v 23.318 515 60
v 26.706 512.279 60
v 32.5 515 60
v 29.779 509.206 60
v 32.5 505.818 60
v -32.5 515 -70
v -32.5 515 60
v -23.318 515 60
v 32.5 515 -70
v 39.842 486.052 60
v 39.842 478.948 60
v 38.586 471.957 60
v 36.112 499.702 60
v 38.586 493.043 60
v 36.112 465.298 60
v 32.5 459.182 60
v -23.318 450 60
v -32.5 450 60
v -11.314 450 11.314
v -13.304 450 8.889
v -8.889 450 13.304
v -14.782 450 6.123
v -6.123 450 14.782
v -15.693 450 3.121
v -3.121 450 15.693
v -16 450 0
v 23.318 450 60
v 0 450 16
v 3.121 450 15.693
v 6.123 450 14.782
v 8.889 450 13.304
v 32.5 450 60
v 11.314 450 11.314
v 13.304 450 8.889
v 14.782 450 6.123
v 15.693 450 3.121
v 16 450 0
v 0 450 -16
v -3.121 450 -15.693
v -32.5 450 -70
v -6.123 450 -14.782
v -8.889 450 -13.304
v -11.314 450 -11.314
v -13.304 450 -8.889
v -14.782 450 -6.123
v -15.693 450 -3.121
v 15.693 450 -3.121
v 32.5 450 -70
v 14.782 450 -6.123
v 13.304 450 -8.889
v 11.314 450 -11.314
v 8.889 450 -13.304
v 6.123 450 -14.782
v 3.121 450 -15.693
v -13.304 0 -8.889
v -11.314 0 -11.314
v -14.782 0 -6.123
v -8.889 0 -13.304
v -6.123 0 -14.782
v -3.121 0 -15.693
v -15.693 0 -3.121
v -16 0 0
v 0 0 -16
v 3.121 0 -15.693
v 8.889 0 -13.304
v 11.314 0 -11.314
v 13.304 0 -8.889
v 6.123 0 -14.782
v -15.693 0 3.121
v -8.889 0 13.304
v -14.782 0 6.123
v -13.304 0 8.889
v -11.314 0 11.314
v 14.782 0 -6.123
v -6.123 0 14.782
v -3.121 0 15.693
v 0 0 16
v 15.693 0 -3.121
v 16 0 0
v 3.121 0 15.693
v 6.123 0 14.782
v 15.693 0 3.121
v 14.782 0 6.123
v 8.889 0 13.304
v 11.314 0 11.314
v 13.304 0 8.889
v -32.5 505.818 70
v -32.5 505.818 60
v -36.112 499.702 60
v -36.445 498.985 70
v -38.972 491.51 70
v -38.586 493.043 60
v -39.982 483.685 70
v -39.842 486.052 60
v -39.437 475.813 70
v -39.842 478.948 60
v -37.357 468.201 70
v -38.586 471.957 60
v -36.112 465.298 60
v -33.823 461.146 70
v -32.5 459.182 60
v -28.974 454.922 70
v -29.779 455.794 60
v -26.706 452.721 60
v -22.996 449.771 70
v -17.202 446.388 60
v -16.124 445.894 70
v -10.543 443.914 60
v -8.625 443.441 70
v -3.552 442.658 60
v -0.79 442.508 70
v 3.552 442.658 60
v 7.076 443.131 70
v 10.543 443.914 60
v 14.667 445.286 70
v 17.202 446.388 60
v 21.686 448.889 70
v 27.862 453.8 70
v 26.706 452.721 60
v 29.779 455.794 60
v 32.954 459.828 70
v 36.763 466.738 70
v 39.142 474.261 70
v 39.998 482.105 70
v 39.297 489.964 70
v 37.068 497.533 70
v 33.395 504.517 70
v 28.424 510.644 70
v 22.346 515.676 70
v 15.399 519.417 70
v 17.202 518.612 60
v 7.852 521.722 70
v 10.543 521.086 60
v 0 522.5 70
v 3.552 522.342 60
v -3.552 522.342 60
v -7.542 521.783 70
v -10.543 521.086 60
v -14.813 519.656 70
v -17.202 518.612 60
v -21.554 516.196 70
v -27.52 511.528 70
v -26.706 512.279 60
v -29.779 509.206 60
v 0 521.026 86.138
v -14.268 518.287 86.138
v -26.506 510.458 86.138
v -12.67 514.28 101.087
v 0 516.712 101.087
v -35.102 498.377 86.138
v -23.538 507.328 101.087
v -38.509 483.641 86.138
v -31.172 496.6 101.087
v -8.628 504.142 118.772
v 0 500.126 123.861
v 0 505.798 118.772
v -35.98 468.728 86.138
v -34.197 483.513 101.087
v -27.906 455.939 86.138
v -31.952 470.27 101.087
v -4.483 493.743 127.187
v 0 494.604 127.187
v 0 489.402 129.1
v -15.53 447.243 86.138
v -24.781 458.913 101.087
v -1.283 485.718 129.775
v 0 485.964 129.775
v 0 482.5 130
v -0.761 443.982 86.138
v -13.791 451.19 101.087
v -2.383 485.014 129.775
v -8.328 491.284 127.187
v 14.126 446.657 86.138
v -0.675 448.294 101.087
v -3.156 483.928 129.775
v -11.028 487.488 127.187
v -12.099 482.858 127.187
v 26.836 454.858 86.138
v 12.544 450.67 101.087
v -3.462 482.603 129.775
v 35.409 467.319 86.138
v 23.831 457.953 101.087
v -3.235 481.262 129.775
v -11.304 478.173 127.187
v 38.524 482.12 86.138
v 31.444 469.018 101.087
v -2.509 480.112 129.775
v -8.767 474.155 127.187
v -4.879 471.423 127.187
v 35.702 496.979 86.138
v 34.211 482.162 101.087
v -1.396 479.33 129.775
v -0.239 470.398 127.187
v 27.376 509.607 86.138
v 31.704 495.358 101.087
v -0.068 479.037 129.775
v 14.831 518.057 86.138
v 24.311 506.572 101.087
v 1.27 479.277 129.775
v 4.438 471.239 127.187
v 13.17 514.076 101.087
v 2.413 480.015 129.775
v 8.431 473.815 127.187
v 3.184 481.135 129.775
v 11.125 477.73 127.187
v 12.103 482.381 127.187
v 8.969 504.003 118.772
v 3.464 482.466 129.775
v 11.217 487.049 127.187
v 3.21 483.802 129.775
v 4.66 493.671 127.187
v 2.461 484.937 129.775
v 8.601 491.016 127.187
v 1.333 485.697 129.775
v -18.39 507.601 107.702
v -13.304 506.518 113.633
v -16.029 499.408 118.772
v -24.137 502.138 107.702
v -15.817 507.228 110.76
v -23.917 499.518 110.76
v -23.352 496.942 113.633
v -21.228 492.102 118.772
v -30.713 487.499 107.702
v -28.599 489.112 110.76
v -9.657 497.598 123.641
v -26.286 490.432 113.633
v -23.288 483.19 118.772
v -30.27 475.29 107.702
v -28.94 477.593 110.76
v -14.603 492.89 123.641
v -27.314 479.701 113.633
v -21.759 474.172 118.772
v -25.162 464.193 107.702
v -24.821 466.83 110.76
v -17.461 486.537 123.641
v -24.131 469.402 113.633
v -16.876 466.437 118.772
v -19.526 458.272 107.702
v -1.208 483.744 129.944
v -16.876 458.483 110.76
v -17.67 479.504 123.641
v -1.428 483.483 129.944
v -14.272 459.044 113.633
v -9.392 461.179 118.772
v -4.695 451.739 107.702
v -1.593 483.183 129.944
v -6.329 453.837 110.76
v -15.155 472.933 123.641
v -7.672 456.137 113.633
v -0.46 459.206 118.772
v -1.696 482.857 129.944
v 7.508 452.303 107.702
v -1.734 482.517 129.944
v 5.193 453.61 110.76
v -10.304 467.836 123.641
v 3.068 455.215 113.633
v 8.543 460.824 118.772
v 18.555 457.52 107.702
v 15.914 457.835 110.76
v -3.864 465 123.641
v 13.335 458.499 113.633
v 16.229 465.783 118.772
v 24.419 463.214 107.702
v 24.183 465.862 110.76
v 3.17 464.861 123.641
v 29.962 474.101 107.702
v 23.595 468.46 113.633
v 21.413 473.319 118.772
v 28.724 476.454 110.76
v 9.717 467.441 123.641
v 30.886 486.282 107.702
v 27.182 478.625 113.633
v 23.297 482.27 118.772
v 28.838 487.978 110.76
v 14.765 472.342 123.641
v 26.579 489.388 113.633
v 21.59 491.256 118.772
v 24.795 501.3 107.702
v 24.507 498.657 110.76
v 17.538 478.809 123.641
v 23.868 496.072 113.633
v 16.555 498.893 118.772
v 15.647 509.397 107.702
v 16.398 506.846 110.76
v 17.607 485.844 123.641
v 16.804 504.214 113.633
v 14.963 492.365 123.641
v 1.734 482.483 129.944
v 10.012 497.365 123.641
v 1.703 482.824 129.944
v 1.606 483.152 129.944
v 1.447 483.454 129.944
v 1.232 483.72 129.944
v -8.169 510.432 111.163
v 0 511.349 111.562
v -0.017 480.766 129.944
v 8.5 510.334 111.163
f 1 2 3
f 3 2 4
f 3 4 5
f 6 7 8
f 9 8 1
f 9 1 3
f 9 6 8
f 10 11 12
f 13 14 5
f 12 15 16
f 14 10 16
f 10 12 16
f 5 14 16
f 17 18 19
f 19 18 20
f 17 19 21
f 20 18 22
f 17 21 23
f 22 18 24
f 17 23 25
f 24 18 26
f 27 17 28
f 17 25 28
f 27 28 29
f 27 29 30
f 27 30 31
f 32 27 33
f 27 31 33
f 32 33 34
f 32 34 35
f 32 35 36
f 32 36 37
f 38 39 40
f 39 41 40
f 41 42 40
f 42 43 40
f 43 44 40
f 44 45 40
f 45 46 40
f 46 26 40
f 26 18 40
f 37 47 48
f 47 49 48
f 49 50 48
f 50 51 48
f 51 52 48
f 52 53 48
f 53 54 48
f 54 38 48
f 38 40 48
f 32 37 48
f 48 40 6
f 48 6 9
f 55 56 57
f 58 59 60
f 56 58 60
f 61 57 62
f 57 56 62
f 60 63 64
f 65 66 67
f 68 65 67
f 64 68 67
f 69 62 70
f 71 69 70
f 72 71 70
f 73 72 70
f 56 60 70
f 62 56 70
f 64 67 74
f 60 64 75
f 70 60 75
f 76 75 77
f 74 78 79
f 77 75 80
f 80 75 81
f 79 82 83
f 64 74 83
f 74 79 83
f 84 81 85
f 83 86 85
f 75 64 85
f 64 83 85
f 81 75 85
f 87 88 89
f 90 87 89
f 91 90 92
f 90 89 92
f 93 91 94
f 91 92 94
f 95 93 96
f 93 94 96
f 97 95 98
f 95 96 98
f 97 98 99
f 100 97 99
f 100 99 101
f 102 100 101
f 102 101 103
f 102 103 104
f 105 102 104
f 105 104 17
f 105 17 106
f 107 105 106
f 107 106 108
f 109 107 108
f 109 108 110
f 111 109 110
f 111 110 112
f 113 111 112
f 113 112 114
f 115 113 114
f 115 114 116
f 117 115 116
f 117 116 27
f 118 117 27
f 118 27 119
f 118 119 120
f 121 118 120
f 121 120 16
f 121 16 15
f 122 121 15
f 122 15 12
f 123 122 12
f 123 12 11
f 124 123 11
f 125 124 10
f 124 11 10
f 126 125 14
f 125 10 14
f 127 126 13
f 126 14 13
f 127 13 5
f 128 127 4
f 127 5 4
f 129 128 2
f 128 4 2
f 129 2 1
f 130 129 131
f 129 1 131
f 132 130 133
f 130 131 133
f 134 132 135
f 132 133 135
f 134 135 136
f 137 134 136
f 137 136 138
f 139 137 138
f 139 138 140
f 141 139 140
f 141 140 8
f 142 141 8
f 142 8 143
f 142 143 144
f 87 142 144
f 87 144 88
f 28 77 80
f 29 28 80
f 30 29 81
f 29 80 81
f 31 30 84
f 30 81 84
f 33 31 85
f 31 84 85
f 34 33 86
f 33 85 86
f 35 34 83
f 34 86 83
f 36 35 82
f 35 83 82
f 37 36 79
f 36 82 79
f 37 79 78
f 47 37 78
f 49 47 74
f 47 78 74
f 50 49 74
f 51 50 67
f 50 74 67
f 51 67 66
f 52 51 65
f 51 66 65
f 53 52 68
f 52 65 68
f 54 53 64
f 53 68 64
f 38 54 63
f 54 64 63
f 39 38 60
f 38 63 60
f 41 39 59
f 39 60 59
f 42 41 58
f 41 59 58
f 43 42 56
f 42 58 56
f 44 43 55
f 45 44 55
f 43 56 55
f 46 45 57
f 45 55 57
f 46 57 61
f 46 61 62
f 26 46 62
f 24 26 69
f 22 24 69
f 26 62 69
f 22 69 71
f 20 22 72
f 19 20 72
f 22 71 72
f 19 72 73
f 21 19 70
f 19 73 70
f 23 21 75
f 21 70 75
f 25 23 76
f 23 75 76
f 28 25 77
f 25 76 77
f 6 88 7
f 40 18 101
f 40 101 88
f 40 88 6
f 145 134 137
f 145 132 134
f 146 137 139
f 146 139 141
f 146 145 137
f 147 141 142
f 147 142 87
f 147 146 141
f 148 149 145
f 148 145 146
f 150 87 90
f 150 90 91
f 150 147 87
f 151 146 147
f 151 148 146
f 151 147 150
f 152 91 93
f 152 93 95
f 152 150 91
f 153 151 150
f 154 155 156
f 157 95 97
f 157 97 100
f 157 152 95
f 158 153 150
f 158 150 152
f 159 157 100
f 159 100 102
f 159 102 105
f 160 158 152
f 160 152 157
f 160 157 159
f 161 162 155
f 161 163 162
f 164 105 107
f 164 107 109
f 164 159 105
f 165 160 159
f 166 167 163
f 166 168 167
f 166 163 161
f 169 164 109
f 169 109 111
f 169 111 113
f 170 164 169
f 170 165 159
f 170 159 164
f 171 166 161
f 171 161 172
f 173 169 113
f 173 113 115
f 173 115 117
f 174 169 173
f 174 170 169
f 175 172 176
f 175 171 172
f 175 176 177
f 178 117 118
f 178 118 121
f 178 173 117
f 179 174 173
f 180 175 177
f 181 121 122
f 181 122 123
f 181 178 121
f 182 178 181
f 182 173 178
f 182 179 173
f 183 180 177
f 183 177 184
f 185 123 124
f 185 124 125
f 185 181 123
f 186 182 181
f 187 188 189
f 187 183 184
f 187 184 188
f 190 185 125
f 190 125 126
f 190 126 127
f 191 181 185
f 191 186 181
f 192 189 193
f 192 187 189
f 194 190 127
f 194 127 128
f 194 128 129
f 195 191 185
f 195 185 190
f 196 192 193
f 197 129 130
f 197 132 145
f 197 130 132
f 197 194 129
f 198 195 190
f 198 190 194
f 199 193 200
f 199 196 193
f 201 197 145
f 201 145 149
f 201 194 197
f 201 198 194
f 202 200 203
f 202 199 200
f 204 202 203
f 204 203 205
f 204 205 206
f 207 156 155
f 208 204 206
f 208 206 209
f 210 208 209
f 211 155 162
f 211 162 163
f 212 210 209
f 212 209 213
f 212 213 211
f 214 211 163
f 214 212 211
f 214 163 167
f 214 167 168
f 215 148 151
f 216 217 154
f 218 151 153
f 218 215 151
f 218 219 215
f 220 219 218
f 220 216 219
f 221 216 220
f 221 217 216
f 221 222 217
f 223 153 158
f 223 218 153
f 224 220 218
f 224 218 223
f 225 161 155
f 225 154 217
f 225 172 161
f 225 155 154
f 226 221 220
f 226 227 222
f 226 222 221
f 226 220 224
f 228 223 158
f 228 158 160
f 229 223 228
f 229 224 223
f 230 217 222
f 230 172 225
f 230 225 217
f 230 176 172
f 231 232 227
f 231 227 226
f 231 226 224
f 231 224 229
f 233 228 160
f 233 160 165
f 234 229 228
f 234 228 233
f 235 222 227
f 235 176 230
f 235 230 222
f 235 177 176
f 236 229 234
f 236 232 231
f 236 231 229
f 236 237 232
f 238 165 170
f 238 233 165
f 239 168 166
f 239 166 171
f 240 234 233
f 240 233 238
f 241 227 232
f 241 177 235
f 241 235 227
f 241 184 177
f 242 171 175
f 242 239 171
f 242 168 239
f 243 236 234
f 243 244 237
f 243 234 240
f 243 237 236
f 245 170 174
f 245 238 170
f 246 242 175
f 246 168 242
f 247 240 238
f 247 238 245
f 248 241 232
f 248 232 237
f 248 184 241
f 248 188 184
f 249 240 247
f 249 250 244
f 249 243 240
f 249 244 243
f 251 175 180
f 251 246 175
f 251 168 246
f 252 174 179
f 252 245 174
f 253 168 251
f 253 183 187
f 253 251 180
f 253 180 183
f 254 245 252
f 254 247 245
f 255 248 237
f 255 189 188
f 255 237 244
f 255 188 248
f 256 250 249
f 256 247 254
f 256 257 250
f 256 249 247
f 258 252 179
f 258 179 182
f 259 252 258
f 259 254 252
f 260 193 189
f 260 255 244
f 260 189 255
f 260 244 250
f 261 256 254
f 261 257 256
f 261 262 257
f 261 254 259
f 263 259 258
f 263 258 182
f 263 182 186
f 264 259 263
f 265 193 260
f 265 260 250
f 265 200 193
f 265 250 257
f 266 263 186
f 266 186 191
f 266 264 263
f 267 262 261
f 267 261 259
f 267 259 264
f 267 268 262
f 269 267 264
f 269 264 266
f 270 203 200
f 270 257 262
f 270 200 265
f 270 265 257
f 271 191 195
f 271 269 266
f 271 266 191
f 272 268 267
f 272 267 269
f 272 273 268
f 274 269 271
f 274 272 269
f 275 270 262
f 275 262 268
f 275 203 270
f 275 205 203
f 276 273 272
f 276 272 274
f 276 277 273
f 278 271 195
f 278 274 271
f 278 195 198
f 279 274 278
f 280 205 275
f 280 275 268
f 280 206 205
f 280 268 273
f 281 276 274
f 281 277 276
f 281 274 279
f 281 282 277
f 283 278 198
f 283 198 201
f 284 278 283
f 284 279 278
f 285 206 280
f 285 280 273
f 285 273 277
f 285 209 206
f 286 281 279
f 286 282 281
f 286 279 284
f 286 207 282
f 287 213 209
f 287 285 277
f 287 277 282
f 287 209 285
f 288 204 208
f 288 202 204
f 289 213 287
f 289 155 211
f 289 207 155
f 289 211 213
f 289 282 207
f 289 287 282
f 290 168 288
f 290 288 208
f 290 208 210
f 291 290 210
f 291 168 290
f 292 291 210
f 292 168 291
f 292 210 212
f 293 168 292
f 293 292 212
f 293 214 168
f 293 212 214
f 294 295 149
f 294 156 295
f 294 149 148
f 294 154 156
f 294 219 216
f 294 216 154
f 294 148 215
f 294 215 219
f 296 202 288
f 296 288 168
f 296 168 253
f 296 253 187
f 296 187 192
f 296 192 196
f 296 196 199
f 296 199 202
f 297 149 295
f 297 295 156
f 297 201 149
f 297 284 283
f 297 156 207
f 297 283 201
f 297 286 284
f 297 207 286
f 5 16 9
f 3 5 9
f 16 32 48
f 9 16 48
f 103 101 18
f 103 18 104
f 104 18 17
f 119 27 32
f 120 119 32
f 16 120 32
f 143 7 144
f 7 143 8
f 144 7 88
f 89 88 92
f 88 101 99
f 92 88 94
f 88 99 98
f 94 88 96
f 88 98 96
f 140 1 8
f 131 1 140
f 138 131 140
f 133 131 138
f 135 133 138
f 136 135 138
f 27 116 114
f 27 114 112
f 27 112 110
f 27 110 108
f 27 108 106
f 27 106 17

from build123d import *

# Parameters (mm, degrees)
SKETCH1_R           = 16
BOSS_EXTRUDE1_DEPTH = 450
SKETCH2_W           = 65
SKETCH2_H           = 130
BOSS_EXTRUDE2_DEPTH = 65
SKETCH3_R           = 40
BOSS_EXTRUDE3_DEPTH = 10
DOME1_FACE_RADIUS   = 40
DOME1_HEIGHT        = 60


with BuildPart() as part:
    # Sketch1 → Boss-Extrude1 (new body)
    with BuildSketch(Plane(origin=(0, 0, 0), x_dir=(1, 0, 0), z_dir=(0, 1, 0))):
        Circle(SKETCH1_R)
    extrude(amount=BOSS_EXTRUDE1_DEPTH)

    # Sketch2 → Boss-Extrude2 (add)
    with BuildSketch(Plane(origin=(0, 450, 0), x_dir=(1, 0, 0), z_dir=(0, 1, 0))):
        with Locations((0, 5)):
            Rectangle(SKETCH2_W, SKETCH2_H)
    extrude(amount=BOSS_EXTRUDE2_DEPTH)

    # Sketch3 → Boss-Extrude3 (add)
    with BuildSketch(Plane.XY.offset(60)):
        with Locations((0, 482.5)):
            Circle(SKETCH3_R)
    extrude(amount=BOSS_EXTRUDE3_DEPTH)

    # Dome1: an elliptical dome of height H over a round flat face of radius A is half a spheroid: the quarter ellipse of half axes A and H revolved about the face's axis
    with BuildSketch(Plane((0, 482.5, 70), x_dir=(0, 1, 0), z_dir=(1, 0, 0)), mode=Mode.PRIVATE) as dome1_quarter:
        Ellipse(DOME1_FACE_RADIUS, DOME1_HEIGHT)
        Rectangle(DOME1_FACE_RADIUS, DOME1_HEIGHT, align=(Align.MIN, Align.MIN), mode=Mode.INTERSECT)
    revolve(dome1_quarter.sketch, axis=Axis((0, 482.5, 70), (0, 0, 1)))


solid = part.part
